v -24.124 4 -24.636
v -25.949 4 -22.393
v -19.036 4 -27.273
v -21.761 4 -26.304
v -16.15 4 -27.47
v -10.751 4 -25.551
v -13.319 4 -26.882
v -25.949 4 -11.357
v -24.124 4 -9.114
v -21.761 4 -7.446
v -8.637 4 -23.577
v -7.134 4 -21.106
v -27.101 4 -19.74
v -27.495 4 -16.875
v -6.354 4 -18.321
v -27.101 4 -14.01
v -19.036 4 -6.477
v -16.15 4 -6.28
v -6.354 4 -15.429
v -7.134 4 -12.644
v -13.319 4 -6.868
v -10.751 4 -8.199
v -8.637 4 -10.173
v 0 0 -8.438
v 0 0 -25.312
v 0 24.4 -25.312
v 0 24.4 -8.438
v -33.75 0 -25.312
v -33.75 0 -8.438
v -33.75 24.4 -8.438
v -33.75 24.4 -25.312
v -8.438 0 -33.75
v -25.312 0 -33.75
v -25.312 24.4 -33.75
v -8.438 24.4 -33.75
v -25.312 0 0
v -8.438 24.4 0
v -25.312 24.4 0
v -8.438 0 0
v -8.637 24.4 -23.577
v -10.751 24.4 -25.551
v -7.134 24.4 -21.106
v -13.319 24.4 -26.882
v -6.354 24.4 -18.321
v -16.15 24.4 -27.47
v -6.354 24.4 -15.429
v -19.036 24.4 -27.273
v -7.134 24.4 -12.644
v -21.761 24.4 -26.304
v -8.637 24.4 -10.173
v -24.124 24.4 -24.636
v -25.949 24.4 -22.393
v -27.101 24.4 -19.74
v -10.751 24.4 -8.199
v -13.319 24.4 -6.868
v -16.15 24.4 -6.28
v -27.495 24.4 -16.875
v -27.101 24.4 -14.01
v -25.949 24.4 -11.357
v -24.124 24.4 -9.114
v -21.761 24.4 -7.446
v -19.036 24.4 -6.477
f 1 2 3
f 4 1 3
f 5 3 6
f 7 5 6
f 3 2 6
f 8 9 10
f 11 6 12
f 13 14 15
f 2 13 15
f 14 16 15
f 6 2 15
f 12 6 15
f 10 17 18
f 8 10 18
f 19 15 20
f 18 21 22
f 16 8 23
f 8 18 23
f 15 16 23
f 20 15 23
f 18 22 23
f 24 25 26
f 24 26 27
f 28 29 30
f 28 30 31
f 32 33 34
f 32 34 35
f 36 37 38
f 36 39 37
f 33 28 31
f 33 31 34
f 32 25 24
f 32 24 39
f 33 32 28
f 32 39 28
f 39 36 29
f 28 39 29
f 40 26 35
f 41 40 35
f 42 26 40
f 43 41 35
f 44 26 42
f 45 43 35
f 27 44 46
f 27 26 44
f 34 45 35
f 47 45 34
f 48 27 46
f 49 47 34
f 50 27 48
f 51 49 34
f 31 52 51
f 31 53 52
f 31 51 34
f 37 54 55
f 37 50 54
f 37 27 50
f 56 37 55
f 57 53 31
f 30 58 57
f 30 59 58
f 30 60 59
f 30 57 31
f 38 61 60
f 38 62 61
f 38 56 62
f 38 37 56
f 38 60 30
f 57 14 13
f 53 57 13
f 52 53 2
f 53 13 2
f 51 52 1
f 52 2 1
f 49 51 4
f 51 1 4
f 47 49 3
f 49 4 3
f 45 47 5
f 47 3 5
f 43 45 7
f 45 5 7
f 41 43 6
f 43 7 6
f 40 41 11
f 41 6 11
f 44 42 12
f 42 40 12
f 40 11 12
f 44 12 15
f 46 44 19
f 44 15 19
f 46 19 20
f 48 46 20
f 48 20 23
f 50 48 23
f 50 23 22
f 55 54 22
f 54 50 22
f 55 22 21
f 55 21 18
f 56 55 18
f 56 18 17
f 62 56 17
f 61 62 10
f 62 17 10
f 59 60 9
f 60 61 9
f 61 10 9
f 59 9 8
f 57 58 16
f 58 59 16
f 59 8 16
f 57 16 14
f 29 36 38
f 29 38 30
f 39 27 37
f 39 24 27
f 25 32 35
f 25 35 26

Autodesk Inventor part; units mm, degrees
ref_plane "YZ Plane" through (0, 0, 0) normal (1, 0, 0) x (0, 1, 0)
ref_plane "XZ Plane" through (0, 0, 0) normal (0, 1, 0) x (-1, 0, 0)
ref_plane "XY Plane" through (0, 0, 0) normal (0, 0, 1) x (1, 0, 0)
sketch "Sketch1" plane through (0, 0, 0) normal (0, 1, 0) x (-1, 0, 0)
  line L0 (0, 0) -> (0, -16.875) construction
  line L1 (0, -33.75) -> (16.875, -33.75) construction
  line L2 (33.75, -33.75) -> (33.75, -16.875) construction
  line L3 (33.75, 0) -> (16.875, 0) construction
  line L4 (33.75, -16.875) -> (0, -16.875) construction
  line L5 (16.875, -33.75) -> (16.875, 0) construction
  circle A0 centre (16.875, -16.875) radius 10.62
  line L6 (33.75, -16.875) -> (33.75, 0) construction
  line L7 (16.875, 0) -> (0, 0) construction
  line L8 (0, -16.875) -> (0, -33.75) construction
  line L9 (16.875, -33.75) -> (33.75, -33.75) construction
  line L10 (33.75, -25.3125) -> (25.3125, -33.75)
  line L11 (8.4375, -33.75) -> (0, -25.3125)
  line L12 (0, -8.4375) -> (8.4375, 0)
  line L13 (25.3125, 0) -> (33.75, -8.4375)
  line L14 (8.4375, 0) -> (25.3125, 0)
  line L15 (33.75, -8.4375) -> (33.75, -25.3125)
  line L16 (25.3125, -33.75) -> (8.4375, -33.75)
  line L17 (0, -25.3125) -> (0, -8.4375)
  dimension "d0" = 33.75
  dimension "d1" = 33.75
  dimension "d2" = 21.24
extrude "Extrusion1" add sketch "Sketch1" along normal blind 24.4
sketch "Sketch2" plane through (0, 0, 0) normal (0, -1, 0) x (1, 0, 0)
  circle A0 centre (-16.875, -16.875) radius 10.62 projected
  point P0 (0, 0)
extrude "Extrusion2" add sketch "Sketch2" against normal blind 4
properties part number "dummy gopro nickle holder"
